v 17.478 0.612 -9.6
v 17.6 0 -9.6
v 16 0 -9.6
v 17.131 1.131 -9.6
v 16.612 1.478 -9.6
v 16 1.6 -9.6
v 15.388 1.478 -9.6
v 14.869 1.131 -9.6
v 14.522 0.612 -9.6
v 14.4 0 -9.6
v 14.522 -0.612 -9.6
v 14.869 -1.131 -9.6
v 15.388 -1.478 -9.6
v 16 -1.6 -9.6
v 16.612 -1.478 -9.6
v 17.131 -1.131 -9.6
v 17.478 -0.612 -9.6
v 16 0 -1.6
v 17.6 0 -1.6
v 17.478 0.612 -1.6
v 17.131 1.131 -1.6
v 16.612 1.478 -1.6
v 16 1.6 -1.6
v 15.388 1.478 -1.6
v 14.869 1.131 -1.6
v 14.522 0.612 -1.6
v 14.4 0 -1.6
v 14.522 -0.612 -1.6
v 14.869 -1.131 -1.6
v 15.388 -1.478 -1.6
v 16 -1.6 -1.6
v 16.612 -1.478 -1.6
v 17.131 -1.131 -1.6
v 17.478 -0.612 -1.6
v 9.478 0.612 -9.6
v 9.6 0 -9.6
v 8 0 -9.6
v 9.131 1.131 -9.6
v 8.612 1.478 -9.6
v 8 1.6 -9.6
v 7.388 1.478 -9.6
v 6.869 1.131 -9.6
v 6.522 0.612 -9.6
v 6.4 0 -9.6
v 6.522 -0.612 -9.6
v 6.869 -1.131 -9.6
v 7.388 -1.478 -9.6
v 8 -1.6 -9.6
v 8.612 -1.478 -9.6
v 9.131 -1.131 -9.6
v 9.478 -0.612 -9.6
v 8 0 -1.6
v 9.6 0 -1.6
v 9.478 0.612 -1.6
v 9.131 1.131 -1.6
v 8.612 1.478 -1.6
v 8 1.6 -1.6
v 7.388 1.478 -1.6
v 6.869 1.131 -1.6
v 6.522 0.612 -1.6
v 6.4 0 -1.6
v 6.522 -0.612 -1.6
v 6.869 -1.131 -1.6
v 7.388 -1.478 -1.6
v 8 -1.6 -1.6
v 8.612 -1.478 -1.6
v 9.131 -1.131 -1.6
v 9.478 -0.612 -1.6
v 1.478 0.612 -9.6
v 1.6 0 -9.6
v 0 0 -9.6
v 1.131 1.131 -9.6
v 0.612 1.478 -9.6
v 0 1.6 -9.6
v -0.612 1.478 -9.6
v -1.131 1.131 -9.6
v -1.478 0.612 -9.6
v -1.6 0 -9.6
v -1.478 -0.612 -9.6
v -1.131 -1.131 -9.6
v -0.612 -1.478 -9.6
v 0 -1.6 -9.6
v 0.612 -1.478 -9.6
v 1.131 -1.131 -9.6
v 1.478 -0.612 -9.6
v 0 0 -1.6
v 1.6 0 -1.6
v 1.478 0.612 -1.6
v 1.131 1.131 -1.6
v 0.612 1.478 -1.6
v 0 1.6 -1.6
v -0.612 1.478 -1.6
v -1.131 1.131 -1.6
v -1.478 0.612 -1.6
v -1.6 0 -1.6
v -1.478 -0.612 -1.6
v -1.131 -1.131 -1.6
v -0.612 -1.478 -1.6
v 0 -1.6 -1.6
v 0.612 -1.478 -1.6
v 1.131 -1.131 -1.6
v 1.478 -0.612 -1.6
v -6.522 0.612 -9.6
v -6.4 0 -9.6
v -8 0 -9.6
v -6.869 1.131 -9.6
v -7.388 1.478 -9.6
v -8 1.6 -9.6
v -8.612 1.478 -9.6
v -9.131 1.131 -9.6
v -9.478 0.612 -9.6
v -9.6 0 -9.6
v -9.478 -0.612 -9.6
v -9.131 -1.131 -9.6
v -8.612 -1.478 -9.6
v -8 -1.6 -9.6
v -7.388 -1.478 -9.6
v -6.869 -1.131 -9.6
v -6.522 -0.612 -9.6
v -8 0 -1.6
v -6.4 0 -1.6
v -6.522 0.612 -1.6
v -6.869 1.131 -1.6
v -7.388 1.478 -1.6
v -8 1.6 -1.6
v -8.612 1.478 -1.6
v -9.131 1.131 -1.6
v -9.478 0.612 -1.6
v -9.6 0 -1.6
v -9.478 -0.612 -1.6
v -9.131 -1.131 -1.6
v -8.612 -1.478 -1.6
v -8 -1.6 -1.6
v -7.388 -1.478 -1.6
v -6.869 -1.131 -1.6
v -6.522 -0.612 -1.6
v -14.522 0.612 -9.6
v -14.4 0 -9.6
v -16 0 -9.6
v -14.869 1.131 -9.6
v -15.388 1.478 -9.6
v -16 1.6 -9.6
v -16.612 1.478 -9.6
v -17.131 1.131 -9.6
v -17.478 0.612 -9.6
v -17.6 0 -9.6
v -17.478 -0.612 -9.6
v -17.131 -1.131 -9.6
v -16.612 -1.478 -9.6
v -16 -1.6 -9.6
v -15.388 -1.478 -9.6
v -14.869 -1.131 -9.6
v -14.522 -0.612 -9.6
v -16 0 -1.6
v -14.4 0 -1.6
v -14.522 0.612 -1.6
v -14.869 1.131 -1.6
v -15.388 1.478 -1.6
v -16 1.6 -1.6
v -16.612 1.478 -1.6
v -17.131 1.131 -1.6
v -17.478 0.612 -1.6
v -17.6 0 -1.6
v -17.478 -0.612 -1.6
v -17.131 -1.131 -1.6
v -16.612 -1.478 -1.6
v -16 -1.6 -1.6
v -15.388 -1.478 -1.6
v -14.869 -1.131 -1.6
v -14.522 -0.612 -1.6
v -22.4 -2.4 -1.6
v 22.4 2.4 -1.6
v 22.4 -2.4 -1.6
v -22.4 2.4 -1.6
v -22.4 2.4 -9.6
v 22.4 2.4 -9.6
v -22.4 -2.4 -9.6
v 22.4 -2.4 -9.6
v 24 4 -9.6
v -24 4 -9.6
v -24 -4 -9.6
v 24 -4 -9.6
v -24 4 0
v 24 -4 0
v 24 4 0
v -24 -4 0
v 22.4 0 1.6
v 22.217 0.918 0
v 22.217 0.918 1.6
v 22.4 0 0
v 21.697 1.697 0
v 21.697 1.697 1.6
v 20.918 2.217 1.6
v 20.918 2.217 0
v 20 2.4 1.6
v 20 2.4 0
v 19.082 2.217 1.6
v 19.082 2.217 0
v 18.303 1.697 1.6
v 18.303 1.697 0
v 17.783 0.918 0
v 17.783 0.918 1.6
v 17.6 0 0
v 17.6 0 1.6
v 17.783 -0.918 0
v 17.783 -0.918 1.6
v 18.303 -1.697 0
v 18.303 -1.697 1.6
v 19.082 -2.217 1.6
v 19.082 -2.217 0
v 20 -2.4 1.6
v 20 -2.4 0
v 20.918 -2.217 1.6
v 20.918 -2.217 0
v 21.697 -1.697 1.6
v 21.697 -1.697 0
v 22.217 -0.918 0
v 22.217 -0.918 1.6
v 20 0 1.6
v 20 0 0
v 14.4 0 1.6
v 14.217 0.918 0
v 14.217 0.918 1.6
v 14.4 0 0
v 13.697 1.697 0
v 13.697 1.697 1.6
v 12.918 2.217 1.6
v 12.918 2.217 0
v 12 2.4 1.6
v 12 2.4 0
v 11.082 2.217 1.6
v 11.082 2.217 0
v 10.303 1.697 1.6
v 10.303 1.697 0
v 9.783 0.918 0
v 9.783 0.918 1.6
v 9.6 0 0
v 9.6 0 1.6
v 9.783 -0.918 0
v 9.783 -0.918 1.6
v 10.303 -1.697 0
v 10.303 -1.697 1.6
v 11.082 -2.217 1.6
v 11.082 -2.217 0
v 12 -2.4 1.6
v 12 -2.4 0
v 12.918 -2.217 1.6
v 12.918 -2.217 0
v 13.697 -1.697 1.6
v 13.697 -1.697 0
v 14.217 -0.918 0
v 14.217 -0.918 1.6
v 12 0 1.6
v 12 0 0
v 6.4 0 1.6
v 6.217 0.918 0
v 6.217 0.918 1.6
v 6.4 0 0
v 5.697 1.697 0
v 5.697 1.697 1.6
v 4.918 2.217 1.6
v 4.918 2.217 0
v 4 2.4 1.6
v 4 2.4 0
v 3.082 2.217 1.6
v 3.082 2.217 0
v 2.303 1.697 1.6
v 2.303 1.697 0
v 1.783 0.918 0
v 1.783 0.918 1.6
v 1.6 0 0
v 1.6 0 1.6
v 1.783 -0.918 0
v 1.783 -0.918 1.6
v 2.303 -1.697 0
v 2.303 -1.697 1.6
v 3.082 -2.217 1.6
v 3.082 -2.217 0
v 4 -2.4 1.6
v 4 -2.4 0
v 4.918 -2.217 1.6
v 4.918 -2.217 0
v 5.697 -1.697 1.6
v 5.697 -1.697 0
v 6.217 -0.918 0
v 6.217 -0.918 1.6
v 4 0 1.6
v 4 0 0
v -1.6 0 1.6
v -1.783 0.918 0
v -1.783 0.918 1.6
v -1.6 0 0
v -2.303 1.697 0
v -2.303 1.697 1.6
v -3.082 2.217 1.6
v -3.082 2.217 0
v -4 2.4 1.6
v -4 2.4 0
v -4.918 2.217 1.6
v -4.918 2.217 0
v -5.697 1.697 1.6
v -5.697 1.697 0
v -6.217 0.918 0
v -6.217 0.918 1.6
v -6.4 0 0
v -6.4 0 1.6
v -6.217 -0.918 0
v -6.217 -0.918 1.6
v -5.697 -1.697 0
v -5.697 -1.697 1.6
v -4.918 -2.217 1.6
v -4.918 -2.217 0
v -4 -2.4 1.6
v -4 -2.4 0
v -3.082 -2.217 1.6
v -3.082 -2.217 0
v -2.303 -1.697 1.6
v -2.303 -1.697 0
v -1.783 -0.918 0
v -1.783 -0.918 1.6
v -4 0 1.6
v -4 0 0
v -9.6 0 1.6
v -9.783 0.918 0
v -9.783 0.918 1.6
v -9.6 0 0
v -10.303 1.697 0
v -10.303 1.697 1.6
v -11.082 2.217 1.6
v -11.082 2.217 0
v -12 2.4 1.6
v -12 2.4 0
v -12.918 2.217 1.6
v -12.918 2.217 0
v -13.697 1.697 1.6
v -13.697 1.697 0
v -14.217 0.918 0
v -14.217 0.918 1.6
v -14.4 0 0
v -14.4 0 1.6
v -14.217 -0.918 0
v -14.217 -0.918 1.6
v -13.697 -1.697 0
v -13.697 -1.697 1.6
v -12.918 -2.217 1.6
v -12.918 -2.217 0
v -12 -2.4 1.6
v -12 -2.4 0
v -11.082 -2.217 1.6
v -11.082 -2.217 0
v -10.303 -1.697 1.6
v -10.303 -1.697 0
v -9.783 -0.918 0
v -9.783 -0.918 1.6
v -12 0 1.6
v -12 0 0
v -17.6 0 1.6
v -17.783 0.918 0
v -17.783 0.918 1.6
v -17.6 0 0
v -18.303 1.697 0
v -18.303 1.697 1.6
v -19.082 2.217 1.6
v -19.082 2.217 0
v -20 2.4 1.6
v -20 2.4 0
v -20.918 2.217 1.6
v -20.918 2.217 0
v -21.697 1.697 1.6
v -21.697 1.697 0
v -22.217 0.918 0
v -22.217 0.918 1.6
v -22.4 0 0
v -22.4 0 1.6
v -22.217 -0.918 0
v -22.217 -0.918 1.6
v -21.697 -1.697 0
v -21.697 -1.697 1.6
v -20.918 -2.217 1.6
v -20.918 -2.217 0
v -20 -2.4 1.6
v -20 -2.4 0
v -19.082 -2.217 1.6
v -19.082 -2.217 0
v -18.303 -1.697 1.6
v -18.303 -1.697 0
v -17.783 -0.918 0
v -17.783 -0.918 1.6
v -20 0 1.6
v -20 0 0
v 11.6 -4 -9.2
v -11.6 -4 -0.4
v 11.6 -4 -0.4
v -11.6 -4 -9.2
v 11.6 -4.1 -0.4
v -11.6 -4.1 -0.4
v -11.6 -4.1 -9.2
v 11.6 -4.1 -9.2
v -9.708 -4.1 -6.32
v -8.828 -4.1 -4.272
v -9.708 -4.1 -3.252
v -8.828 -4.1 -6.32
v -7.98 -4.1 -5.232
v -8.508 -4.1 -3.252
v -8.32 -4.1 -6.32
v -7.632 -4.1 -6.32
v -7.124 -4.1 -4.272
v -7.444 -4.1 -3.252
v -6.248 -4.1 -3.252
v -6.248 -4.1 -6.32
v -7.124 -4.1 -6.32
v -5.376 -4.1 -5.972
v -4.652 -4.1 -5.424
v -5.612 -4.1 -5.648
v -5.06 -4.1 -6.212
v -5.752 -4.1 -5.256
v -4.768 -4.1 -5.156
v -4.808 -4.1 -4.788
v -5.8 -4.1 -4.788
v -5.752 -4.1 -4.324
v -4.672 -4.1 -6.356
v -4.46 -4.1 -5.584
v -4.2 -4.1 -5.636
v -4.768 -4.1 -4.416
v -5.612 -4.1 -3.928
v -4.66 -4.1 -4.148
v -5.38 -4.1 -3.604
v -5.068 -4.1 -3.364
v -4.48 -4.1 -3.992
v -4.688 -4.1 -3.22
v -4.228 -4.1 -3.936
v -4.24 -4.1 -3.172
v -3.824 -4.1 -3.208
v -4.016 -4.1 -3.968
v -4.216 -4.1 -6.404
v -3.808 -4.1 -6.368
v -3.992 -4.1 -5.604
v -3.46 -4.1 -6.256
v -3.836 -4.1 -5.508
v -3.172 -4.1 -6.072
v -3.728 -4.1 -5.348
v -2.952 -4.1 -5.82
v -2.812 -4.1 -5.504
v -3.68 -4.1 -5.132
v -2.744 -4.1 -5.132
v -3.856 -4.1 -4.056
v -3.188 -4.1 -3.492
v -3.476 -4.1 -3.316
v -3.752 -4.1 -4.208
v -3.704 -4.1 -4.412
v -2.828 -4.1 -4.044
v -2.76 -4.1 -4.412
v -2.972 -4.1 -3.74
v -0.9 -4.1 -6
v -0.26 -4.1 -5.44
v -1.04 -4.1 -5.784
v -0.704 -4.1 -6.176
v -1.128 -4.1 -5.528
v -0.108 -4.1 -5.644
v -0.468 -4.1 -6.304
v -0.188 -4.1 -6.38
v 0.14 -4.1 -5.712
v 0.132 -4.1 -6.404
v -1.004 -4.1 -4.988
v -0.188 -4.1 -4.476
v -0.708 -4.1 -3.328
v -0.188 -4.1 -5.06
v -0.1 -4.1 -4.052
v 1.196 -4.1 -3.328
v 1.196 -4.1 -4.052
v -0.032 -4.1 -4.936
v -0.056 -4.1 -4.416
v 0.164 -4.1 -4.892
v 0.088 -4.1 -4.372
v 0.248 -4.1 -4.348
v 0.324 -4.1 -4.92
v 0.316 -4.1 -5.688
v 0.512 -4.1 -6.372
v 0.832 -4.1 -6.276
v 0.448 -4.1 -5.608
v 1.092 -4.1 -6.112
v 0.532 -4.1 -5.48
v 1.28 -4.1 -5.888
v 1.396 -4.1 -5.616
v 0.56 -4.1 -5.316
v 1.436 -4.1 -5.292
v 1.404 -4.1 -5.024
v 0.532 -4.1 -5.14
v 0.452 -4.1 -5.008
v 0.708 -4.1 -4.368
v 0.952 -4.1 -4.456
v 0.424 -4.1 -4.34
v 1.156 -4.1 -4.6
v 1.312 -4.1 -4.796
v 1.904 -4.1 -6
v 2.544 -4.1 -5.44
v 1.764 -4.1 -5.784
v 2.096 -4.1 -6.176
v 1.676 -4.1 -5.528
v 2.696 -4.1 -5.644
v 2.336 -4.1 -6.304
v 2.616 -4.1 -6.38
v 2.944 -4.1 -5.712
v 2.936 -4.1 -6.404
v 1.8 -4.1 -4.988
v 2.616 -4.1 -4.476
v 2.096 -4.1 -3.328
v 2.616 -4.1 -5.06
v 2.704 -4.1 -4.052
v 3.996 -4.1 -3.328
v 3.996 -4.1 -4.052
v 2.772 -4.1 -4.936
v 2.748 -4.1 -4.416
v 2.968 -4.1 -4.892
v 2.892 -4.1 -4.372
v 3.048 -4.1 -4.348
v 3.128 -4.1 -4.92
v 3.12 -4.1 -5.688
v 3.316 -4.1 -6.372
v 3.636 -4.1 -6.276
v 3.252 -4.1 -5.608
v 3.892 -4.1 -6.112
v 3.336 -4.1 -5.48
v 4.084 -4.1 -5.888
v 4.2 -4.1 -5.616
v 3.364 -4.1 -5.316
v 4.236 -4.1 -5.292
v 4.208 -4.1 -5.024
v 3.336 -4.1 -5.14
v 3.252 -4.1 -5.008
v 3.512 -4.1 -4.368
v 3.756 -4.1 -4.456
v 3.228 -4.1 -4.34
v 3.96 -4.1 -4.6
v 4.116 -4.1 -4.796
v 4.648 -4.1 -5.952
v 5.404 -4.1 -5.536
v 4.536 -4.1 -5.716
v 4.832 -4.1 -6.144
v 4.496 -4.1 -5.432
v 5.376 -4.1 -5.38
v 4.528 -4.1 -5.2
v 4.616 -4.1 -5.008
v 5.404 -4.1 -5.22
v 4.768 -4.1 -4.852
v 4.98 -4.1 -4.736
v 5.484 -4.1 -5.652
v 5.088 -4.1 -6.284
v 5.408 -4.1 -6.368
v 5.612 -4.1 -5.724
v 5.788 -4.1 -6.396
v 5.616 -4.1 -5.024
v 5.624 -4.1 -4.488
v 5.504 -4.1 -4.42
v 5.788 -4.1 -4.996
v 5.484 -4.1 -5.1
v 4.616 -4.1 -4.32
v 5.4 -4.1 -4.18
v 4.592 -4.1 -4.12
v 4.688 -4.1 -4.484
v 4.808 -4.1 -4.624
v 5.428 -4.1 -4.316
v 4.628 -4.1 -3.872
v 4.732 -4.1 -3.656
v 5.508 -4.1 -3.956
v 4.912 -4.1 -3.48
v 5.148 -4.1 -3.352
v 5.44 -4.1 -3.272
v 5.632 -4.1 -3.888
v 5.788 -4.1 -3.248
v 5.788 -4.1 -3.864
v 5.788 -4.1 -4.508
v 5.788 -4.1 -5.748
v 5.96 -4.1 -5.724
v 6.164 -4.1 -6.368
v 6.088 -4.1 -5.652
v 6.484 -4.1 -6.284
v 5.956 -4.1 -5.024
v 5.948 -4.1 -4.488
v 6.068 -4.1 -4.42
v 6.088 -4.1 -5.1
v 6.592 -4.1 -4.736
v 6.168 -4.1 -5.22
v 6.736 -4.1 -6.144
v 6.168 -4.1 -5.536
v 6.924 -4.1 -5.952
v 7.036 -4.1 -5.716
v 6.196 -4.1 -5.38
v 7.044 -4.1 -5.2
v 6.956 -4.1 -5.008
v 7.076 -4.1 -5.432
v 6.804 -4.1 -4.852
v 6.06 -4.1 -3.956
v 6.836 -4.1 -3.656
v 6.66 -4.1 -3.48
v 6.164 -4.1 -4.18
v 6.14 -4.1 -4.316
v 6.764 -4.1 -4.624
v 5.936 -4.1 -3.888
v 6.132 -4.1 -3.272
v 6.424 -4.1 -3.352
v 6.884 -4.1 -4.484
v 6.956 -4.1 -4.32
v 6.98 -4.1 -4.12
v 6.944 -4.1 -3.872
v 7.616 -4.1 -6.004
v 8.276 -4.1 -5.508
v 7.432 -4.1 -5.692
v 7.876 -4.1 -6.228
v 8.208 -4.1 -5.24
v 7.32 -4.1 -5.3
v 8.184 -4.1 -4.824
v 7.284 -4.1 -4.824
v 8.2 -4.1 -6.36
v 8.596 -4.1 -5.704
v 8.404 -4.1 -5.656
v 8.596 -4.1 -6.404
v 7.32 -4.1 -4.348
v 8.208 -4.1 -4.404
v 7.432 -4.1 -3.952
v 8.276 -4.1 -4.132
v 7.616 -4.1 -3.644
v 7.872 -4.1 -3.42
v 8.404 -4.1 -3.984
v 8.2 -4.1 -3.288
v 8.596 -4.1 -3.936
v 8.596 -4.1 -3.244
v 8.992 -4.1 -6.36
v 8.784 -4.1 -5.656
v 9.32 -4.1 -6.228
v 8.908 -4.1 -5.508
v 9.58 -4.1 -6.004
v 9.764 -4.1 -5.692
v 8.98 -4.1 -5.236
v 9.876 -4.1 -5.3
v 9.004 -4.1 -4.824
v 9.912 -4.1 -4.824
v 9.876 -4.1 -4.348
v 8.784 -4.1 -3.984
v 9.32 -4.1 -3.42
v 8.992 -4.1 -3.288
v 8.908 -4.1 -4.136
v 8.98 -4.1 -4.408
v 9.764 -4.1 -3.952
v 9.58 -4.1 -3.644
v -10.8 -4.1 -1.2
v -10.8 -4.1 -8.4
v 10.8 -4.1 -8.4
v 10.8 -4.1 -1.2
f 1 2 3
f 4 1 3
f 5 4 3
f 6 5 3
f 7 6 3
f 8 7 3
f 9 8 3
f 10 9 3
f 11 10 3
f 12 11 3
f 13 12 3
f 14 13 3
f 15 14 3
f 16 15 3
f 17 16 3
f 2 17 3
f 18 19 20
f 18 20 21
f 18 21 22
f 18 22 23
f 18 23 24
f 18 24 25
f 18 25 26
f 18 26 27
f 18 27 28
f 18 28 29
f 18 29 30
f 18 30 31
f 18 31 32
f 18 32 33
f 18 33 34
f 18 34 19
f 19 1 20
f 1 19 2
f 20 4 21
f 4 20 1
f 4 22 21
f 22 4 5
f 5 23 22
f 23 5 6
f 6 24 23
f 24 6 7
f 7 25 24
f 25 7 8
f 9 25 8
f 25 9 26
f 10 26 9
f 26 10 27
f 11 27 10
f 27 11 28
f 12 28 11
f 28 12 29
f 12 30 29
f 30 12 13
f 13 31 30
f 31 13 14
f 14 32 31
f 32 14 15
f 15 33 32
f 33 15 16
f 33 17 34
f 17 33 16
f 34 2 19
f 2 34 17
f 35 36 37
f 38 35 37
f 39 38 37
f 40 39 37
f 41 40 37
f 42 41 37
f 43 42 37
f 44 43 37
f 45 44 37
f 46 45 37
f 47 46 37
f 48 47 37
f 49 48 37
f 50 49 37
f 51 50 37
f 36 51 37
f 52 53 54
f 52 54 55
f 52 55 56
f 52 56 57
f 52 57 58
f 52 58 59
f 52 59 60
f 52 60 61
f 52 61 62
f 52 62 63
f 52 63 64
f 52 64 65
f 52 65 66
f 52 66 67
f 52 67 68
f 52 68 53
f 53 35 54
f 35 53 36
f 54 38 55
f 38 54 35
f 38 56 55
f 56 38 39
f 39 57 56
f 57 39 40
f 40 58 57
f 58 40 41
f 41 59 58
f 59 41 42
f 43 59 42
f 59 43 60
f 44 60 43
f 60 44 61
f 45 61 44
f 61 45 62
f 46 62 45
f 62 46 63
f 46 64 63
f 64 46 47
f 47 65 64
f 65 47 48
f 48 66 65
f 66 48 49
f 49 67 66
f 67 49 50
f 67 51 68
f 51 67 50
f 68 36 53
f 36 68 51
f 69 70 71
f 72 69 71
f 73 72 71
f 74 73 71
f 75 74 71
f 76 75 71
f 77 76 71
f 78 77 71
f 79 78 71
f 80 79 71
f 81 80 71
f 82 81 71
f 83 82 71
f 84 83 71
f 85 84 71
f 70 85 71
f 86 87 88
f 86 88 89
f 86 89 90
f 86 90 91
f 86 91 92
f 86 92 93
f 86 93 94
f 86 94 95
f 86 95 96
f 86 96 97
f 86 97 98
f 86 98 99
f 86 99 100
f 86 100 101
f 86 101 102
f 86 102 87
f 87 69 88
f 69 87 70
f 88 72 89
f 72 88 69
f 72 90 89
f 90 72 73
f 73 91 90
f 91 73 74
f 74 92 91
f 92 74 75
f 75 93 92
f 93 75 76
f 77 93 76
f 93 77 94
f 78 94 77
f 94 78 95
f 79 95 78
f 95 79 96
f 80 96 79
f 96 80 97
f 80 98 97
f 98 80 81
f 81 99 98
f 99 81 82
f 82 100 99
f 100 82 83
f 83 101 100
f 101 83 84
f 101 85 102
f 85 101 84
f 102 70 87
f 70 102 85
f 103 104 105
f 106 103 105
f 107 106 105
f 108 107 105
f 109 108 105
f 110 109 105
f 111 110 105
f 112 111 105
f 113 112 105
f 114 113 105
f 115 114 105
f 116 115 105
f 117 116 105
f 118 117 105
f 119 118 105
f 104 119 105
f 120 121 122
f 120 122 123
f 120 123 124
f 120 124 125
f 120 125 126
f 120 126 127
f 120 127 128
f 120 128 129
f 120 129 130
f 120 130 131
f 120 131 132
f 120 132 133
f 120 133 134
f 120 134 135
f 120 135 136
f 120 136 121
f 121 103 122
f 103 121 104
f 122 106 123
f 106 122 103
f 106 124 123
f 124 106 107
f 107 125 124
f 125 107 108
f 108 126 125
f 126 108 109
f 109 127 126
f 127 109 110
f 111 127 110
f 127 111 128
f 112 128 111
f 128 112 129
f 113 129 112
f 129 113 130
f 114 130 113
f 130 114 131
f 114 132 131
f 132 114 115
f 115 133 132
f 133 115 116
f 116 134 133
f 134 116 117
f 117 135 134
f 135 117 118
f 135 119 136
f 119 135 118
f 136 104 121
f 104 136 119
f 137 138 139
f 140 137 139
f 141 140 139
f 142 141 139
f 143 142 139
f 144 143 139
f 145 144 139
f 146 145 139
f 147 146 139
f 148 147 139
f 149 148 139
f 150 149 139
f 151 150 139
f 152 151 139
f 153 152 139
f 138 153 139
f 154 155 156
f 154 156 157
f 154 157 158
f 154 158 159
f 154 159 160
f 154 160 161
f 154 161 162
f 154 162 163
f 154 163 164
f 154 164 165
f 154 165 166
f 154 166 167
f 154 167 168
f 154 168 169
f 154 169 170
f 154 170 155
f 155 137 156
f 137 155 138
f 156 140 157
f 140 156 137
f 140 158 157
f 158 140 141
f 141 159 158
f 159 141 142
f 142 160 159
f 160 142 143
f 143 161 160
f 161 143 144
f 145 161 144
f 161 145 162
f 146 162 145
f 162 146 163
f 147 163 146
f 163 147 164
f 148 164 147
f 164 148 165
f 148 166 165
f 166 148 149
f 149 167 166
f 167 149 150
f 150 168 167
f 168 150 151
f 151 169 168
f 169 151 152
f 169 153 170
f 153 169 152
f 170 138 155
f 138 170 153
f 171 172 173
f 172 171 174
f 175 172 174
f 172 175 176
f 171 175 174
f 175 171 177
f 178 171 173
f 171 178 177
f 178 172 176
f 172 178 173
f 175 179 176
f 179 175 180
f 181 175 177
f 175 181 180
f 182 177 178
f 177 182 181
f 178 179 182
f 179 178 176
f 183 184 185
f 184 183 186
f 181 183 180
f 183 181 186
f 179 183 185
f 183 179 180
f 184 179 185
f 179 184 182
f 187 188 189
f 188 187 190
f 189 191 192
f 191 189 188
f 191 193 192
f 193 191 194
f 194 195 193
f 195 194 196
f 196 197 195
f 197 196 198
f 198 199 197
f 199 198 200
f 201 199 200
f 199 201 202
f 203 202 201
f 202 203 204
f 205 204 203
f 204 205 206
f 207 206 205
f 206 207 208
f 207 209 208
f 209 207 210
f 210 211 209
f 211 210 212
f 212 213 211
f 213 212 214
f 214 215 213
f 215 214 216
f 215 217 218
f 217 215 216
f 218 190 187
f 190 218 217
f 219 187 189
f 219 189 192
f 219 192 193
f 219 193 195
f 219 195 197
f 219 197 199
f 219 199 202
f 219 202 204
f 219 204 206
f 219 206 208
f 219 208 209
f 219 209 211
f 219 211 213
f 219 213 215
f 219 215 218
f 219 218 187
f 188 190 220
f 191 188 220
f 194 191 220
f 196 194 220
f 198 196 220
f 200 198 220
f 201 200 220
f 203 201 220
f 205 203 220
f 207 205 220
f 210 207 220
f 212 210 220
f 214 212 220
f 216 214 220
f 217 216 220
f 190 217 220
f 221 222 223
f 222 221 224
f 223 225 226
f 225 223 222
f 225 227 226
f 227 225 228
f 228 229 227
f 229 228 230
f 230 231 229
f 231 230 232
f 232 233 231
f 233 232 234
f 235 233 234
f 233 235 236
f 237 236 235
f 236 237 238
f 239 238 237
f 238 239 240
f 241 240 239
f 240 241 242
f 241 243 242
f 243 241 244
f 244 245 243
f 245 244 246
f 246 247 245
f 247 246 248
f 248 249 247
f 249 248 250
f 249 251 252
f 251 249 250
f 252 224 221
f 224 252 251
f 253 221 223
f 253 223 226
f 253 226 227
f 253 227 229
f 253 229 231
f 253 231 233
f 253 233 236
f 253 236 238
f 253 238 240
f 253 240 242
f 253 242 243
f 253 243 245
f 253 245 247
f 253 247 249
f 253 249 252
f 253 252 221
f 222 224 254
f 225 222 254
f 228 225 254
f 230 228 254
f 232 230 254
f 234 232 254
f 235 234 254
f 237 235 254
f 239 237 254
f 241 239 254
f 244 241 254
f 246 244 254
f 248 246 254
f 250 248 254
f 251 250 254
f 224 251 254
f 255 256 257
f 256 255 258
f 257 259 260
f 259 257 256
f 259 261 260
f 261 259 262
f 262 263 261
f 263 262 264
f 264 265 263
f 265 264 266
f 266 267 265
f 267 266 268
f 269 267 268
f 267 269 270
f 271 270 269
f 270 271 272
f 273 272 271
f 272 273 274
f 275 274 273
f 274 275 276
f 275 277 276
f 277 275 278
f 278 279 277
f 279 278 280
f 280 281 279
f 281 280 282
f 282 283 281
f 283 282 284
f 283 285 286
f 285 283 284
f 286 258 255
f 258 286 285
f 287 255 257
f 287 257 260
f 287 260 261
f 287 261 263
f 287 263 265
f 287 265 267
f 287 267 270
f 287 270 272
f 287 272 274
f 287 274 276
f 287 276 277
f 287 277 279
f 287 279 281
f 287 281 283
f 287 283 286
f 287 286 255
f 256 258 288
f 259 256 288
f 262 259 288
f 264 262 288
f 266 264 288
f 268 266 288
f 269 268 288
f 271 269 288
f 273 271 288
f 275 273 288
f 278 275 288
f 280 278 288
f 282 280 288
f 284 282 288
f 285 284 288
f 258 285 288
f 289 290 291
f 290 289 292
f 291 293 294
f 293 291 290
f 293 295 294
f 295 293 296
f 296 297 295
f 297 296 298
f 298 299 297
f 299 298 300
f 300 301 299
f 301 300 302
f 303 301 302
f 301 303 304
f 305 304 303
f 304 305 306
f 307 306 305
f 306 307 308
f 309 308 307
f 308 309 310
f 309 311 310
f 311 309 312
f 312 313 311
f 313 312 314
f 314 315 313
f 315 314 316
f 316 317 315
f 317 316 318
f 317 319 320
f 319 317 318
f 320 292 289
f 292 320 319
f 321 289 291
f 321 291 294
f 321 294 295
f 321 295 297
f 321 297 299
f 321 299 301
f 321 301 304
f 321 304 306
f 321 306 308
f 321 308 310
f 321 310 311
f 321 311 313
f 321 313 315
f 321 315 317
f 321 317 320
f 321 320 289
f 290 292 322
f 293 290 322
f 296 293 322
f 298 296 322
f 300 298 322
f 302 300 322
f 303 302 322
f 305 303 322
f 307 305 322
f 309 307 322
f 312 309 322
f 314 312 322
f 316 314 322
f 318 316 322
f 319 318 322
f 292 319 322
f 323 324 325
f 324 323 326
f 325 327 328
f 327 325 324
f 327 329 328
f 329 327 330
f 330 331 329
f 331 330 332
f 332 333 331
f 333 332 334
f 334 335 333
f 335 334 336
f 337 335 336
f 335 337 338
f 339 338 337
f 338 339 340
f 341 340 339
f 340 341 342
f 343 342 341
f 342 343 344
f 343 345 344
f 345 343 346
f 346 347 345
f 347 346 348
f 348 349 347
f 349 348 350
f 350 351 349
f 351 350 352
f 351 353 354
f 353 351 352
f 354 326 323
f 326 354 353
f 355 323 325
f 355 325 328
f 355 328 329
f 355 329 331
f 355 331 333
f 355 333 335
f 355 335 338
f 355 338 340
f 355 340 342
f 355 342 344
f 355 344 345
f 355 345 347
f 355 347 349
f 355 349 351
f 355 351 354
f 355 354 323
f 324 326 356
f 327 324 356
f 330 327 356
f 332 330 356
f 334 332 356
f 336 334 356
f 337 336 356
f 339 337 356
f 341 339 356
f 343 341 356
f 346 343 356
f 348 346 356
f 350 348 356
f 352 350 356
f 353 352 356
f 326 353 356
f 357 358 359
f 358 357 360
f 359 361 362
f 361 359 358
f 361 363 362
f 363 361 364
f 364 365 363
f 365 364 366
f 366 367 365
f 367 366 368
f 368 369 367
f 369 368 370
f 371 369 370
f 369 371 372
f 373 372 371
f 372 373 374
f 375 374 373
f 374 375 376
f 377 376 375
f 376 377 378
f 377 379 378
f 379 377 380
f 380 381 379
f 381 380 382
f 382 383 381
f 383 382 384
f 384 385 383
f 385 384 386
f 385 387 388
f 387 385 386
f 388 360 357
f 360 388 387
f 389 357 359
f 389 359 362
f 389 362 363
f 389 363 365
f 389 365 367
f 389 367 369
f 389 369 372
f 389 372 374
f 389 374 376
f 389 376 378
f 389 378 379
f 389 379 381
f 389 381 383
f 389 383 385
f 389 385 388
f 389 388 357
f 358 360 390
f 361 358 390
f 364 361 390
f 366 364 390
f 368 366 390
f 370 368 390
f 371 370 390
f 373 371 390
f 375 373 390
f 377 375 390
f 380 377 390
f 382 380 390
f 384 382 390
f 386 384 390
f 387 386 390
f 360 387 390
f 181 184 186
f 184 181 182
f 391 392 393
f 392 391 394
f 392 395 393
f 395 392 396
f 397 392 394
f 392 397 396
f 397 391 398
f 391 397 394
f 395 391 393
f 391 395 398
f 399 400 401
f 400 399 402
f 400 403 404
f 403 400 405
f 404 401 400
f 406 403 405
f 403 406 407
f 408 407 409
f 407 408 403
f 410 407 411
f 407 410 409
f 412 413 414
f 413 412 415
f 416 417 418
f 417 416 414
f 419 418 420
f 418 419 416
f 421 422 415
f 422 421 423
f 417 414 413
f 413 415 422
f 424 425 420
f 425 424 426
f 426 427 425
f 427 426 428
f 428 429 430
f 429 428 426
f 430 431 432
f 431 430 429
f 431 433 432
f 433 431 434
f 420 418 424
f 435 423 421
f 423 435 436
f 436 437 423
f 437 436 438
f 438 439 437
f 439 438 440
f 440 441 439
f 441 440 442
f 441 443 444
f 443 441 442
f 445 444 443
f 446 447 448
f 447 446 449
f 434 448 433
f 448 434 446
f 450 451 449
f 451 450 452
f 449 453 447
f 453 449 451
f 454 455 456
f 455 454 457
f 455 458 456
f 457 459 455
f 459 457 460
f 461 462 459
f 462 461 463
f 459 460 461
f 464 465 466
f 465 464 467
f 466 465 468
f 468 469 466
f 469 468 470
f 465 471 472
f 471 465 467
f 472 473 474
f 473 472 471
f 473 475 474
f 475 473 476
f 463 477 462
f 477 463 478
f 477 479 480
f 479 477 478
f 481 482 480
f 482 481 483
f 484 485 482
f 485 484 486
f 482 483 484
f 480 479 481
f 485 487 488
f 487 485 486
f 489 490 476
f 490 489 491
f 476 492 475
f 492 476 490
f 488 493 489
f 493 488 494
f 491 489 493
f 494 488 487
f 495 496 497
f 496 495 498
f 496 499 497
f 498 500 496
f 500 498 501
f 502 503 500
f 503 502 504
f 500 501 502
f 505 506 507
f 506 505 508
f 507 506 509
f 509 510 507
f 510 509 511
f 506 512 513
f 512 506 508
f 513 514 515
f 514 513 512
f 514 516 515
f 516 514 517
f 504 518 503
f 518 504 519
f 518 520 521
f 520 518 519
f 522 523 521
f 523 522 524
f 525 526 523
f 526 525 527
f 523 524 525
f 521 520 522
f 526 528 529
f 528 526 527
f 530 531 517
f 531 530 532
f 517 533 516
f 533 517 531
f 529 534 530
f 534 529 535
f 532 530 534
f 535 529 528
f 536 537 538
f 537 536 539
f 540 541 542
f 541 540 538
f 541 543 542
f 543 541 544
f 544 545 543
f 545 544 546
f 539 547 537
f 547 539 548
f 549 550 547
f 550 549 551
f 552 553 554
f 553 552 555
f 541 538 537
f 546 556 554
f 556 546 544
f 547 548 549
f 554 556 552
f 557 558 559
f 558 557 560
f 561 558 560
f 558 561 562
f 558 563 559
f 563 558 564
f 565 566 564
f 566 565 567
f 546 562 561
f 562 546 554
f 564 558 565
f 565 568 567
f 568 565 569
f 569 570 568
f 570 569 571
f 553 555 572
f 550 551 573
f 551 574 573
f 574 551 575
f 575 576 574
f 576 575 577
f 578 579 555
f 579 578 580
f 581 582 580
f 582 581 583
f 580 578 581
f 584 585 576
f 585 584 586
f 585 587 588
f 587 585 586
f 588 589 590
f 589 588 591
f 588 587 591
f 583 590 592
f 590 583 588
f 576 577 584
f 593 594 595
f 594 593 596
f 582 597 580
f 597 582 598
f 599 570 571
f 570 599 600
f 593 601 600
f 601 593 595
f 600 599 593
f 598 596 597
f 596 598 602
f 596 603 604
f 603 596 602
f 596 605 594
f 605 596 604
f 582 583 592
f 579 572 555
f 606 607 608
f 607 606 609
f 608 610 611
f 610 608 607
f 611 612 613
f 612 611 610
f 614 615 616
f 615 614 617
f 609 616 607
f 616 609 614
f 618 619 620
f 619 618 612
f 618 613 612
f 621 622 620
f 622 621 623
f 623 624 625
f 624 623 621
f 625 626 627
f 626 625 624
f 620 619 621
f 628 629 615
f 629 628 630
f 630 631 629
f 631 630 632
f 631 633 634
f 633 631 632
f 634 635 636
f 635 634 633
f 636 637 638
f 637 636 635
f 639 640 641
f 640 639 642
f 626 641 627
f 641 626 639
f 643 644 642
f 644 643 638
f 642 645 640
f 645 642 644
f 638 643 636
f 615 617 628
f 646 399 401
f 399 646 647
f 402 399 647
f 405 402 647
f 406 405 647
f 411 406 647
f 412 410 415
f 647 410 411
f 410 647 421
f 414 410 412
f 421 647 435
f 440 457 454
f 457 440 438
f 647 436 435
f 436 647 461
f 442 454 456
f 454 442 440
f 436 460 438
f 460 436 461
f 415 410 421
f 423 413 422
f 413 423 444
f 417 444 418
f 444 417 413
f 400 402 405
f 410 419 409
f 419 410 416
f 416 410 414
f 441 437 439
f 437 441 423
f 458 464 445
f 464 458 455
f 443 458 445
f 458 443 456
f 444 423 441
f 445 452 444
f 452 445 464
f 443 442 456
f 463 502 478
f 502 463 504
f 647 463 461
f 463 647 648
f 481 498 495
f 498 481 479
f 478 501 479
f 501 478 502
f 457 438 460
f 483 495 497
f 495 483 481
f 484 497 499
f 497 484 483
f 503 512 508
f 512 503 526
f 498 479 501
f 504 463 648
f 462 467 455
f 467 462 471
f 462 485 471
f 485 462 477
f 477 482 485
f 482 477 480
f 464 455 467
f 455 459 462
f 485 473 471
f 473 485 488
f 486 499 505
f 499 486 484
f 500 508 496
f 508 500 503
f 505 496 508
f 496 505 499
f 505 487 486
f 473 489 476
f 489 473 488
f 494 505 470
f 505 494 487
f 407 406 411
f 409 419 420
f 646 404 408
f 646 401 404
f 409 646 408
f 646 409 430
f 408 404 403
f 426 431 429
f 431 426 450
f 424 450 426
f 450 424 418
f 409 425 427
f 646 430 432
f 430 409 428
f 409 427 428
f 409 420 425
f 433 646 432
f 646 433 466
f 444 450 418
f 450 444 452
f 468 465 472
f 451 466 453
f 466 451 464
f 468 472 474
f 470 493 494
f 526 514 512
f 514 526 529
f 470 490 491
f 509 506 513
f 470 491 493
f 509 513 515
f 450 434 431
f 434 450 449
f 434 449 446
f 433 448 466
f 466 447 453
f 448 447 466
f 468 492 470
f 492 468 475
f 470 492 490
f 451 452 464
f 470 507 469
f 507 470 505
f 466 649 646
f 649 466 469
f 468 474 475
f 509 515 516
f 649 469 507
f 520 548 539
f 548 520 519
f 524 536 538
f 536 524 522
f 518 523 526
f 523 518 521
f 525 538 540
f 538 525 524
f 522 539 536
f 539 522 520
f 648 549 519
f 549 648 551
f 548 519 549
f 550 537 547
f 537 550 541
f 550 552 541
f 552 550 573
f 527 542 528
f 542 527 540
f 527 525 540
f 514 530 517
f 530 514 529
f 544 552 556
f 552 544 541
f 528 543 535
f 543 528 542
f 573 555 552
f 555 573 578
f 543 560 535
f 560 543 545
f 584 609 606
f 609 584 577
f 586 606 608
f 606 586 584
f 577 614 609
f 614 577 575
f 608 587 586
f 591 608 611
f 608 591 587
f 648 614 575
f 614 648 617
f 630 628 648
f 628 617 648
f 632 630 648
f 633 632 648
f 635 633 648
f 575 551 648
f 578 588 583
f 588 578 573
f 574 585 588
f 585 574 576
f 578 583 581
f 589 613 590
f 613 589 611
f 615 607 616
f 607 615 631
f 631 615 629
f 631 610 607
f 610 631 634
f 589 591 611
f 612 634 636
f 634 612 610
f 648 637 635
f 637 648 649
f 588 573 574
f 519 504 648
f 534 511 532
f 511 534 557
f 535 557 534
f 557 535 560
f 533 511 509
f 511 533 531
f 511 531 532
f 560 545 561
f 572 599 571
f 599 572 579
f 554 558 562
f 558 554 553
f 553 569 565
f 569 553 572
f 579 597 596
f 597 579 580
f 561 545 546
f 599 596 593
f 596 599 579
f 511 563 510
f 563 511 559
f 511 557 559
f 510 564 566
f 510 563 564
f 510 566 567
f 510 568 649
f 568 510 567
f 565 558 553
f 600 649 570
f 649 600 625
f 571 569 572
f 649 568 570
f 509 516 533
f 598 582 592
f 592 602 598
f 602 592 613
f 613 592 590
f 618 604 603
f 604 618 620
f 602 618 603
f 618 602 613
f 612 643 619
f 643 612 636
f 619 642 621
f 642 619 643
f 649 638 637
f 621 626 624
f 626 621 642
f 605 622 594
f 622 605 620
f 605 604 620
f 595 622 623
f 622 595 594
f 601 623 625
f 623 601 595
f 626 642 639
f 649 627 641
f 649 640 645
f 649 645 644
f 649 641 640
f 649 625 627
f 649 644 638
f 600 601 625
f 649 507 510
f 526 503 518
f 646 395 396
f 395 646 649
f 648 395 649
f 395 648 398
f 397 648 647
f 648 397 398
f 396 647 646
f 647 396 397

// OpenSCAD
use <../lib.scad>
use <197925a.scad>
use <3009.scad>
function ldraw_lib__3009d0j() = [
// 0 Brick  1 x  6 with License Plate "MC 5580" Sticker
// 0 Name: 3009d0j.dat
// 0 Author: Takeshi Takahashi [RainbowDolphin]
// 0 !LDRAW_ORG Shortcut UPDATE 2024-07
// 0 !LICENSE Licensed under CC BY 4.0 : see CAreadme.txt
// 
// 0 BFC CERTIFY CCW
  [0,"BFC","CERTIFY"],
  [0,"BFC","CCW"],
// 
// 0 !CATEGORY Sticker Shortcut
// 0 !KEYWORDS Bricklink 3009pb078, Highway rig, Model Team, Set 5580, truck
// 
// 0 !HISTORY 2024-08-26 [OrionP] Official Update 2024-07
// 
// 1 16 0 0 0 1 0 0 0 1 0 0 0 1 3009.dat
  [1,16,0,0,0,1,0,0,0,1,0,0,0,1, ldraw_lib__3009()],
// 1 16 0 12 -10 1 0 0 0 0 -1 0 1 0 197925a.dat
  [1,16,0,12,-10,1,0,0,0,0,-1,0,1,0, ldraw_lib__197925a()],
];
module ldraw_lib__3009d0j(step=0, col=false, unit=2/5, alt=false, line=0.2, solid=!$preview)
    makepoly(ldraw_lib__3009d0j(), step=step, col=col, unit=unit, alt=alt, line=line, solid=solid);
ldraw_lib__3009d0j(line=0.2);
